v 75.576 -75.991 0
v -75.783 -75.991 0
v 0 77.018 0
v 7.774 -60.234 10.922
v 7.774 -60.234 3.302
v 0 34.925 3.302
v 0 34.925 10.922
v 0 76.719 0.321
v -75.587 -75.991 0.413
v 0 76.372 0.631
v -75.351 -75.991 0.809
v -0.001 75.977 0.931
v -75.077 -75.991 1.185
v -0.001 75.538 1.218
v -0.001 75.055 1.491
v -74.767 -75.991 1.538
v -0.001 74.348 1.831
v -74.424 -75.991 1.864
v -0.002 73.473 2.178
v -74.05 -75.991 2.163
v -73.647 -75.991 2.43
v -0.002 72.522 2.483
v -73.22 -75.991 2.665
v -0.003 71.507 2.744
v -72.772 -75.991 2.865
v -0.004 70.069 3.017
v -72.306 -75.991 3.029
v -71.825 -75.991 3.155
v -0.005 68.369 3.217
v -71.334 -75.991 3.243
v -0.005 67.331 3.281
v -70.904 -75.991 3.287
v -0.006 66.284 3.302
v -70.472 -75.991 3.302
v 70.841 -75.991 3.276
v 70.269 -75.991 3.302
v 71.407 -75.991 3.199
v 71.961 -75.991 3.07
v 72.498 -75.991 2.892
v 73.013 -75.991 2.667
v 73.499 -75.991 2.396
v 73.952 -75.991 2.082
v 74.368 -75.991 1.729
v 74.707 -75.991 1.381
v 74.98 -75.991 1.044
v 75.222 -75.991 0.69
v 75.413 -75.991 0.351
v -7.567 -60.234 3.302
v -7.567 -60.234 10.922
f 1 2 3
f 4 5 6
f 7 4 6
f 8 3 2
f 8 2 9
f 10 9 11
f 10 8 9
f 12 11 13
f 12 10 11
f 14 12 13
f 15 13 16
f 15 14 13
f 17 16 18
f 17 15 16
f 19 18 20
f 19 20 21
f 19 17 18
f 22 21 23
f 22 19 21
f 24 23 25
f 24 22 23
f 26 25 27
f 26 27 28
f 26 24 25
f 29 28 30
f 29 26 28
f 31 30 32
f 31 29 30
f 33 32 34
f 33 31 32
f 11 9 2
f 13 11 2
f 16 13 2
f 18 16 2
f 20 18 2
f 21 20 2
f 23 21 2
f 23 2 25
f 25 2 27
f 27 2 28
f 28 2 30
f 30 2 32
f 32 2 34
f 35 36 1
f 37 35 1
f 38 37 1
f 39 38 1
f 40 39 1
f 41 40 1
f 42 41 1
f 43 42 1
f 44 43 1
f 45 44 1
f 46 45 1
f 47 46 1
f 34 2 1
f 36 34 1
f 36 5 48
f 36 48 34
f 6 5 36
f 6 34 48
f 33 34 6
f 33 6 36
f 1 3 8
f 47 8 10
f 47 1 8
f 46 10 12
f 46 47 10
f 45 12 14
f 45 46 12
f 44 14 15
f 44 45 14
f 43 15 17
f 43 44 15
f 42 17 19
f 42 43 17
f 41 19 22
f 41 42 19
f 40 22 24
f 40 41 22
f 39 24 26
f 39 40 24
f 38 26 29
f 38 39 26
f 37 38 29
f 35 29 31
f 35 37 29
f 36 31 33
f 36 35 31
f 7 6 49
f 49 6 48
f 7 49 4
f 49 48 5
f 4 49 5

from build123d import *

# Parameters (mm, degrees)
F1_DEPTH    = 3.302
F2_T1_DEPTH = 194.5409515442
F2_T3_DEPTH = 194.4495264649
F4_DEPTH    = 7.62


# Not quite as in the source:
# - a fillet or chamfer that OpenCascade refuses, or shapes differently, is made with other operations: its cross-section is extruded or revolved along the edge and cut away or added


with BuildPart() as f1:
    # F0 (on Top) → F1 (new body)
    with BuildSketch(Plane.XY):
        Polygon((75.576454401, -75.9910270572), (0, 77.0177915692), (-75.7826715708, -75.9910270572), align=None)
    extrude(amount=F1_DEPTH)

    # F2: fillet of radius 5.08 on 2 edges, made by hand

    # F2_s2 → F2_t1 (cut)
    with BuildSketch(Plane(origin=(35.9116375184, 72.5073043447, 0), x_dir=(0, 0, 1), z_dir=(-0.4438288555, -0.8961115706, 0))):
        with BuildLine():
            ThreePointArc((0, 34.1827182836), (2.3956458882, 32.3200753886), (3.302, 29.4240298088))
            Line((3.302, 29.4240298088), (3.302, 34.1827182836))
            Line((3.302, 34.1827182836), (0, 34.1827182836))
        make_face()
    extrude(amount=F2_T1_DEPTH, mode=Mode.SUBTRACT)

    # F2_s4 → F2_t3 (cut)
    with BuildSketch(Plane(origin=(50.2640998489, -101.7625211206, 0), x_dir=(0, 0, 1), z_dir=(-0.4428582479, 0.8965916418, 0))):
        with BuildLine():
            ThreePointArc((0, 34.1079642346), (2.3956458882, 32.2453213396), (3.302, 29.3492757599))
            Line((3.302, 29.3492757599), (3.302, 34.1079642346))
            Line((3.302, 34.1079642346), (0, 34.1079642346))
        make_face()
    extrude(amount=F2_T3_DEPTH, mode=Mode.SUBTRACT)

    # F3 (on face) → F4 (join)
    with BuildSketch(Plane.XY.offset(3.302)):
        Polygon((7.7744186856, -60.2337494493), (0, 34.9251665175), (-7.5671025552, -60.2337494493), align=None)
    extrude(amount=F4_DEPTH)


solid = f1.part
